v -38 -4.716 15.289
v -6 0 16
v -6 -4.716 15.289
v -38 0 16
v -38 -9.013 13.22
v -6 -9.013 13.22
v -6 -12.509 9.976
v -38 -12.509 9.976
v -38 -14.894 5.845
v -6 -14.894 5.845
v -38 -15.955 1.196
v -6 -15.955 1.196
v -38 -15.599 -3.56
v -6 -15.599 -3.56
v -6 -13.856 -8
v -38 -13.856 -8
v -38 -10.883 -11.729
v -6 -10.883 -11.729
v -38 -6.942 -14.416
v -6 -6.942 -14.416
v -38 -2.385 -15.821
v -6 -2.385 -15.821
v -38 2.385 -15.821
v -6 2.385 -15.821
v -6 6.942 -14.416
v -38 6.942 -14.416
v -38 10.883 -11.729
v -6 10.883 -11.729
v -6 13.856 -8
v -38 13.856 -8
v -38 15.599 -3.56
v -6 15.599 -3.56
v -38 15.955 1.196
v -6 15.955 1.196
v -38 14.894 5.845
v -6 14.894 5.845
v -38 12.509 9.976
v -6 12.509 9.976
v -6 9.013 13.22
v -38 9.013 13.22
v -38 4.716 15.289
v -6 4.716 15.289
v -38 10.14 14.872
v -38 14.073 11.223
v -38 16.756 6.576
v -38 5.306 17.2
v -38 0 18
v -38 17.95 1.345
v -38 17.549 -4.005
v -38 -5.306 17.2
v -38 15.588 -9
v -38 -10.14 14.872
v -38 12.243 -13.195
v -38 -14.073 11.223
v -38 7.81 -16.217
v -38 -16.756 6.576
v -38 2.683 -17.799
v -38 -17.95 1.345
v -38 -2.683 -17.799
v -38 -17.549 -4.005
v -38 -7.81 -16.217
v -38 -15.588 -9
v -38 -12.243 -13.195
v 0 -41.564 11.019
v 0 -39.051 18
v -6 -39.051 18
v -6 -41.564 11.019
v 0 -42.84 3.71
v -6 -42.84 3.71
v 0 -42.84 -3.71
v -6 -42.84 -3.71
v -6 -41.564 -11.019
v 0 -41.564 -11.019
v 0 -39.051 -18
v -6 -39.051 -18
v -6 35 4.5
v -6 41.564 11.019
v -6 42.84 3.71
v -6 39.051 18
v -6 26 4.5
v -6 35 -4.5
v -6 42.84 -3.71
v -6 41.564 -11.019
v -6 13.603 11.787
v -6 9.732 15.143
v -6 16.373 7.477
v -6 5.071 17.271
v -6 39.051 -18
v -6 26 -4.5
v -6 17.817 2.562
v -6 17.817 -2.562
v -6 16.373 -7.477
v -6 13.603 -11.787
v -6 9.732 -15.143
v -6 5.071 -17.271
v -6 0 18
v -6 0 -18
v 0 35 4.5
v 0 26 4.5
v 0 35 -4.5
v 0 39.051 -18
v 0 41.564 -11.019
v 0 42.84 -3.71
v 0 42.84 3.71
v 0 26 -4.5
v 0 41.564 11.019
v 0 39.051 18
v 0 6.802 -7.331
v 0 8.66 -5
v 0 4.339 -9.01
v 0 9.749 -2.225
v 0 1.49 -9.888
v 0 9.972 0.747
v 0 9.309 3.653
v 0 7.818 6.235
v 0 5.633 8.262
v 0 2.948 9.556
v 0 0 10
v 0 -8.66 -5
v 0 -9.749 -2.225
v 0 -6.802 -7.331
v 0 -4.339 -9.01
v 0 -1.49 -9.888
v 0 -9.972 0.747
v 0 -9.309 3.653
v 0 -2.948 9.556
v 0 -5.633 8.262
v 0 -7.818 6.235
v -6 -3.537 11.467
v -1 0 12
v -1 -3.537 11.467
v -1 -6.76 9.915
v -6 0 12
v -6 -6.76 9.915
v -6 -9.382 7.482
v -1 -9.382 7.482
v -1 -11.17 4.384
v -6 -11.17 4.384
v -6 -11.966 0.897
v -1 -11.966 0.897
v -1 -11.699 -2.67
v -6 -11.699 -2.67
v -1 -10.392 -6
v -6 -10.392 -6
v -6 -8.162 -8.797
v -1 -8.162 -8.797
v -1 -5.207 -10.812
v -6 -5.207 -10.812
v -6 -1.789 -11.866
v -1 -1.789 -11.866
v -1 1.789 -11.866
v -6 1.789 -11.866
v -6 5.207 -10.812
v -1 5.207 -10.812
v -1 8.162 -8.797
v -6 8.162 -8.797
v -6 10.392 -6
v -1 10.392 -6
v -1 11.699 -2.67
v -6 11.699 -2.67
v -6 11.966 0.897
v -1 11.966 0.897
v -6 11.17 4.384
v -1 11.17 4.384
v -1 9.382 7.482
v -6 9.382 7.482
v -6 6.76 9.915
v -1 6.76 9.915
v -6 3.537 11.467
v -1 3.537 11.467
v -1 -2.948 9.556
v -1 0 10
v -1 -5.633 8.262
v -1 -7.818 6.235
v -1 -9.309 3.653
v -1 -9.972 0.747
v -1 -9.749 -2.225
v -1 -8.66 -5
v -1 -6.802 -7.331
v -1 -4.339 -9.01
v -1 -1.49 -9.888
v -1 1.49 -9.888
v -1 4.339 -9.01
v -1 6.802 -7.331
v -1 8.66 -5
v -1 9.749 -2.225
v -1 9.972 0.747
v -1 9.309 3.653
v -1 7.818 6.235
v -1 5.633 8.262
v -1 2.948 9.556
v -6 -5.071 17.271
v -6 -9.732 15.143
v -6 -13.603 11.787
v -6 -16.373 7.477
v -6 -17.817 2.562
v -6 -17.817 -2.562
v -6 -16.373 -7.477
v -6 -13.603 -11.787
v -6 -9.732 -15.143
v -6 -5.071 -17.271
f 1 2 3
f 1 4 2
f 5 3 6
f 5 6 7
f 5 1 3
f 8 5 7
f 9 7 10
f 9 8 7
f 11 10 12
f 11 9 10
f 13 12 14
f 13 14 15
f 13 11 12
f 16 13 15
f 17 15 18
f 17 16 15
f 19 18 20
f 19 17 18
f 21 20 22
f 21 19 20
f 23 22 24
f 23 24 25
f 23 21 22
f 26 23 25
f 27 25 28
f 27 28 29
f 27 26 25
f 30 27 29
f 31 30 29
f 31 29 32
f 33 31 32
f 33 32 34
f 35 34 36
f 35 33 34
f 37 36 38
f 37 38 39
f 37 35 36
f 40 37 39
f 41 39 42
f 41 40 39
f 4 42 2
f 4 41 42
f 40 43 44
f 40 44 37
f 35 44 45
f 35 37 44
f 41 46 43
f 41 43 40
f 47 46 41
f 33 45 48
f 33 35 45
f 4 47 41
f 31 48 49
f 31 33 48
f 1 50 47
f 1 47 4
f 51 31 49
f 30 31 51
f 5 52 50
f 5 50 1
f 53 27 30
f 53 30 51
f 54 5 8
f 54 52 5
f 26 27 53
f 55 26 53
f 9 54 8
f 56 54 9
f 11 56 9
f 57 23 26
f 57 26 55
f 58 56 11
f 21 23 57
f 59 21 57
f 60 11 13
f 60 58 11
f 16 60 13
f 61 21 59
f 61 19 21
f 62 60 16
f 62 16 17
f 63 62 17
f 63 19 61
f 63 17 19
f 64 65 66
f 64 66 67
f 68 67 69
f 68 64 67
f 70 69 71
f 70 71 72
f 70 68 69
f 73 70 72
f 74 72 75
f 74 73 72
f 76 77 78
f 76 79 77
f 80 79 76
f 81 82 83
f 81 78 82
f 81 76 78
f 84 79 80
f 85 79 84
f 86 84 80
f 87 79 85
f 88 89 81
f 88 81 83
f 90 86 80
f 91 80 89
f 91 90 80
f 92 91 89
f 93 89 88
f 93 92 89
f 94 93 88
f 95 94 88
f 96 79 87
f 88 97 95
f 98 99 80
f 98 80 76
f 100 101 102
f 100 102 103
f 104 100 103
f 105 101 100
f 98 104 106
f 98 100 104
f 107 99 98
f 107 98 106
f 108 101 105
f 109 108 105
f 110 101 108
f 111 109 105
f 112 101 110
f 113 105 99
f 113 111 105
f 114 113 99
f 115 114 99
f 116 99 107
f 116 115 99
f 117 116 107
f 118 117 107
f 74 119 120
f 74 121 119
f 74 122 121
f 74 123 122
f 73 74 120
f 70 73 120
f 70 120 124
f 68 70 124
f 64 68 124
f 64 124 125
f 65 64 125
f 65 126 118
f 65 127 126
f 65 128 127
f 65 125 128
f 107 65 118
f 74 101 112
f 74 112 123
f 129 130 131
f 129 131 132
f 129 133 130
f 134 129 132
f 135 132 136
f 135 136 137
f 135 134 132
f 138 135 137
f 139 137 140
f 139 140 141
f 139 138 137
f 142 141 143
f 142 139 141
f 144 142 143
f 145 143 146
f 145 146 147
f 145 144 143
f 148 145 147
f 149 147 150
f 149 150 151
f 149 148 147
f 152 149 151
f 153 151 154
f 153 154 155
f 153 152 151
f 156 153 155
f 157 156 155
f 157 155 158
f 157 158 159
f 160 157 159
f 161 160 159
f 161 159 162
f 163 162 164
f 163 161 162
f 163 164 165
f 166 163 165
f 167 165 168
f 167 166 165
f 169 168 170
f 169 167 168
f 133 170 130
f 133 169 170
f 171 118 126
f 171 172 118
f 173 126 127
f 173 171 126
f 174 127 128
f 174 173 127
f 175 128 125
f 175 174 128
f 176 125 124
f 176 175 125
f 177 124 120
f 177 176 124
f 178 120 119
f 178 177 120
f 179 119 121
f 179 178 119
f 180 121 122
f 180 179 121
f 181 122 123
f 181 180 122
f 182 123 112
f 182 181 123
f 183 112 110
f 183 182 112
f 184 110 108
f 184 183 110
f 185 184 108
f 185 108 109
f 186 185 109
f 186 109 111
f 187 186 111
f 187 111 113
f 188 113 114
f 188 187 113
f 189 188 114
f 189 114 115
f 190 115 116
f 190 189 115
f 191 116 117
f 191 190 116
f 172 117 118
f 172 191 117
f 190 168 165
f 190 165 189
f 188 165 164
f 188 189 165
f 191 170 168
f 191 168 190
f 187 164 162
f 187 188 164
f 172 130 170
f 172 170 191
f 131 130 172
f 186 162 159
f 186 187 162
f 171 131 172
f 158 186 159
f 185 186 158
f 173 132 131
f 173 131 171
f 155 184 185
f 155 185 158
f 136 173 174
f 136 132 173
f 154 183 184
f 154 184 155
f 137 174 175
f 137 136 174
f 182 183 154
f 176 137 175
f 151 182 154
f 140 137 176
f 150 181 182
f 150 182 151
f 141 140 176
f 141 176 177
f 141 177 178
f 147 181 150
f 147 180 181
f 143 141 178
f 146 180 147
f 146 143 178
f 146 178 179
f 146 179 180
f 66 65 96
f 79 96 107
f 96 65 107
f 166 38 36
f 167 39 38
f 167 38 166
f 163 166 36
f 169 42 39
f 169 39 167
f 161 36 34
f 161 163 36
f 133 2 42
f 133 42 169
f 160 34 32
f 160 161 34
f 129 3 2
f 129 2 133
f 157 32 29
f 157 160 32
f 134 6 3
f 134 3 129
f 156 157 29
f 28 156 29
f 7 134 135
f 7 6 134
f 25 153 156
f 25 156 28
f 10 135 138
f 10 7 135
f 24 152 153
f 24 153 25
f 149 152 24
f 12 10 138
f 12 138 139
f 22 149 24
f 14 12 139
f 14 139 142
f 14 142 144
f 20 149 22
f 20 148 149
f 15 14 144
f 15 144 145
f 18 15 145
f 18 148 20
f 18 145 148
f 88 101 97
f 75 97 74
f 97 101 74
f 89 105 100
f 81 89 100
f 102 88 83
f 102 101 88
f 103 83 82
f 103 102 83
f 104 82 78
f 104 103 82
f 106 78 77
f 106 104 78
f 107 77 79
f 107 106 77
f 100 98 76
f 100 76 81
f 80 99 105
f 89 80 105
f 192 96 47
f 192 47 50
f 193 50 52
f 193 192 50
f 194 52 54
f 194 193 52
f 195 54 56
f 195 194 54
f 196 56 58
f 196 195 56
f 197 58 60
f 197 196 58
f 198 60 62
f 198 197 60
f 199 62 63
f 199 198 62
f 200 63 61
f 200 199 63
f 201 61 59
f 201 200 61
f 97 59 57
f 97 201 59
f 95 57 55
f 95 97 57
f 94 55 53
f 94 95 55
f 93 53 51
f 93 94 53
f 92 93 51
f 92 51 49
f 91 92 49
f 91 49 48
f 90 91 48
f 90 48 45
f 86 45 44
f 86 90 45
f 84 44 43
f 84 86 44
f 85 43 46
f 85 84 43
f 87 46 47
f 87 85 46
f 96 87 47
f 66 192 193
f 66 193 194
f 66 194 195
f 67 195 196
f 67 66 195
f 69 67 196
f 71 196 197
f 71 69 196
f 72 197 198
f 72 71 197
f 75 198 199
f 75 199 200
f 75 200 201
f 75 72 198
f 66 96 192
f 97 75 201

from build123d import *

# Parameters (mm, degrees)
SKETCH2_W          = 9
SKETCH2_H          = 9
CUT_EXTRUDE1_DEPTH = 6


with BuildPart() as part:
    # Sketch1 → Revolve1 (revolve)
    with BuildSketch(Plane.XY, mode=Mode.PRIVATE) as revolve1_sk:
        Polygon((-1, 12), (-6, 12), (-6, 16), (-38, 16), (-38, 18), (-6, 18), (-6, 43), (0, 43), (0, 10), (-1, 10), align=None)
    revolve(revolve1_sk.sketch.rotate(Axis((-42.809570876, 0, 0), (1, 0, 0)), 90), axis=Axis((-42.809570876, 0, 0), (1, 0, 0)))

    # Sketch2 → Cut-Extrude1 (cut)
    with BuildSketch(Plane(origin=(0, 0, 0), x_dir=(0, 0, -1), z_dir=(1, 0, 0))):
        with BuildLine():
            Line((-18, -39.05124838), (-18, 39.05124838))
            ThreePointArc((-18, 39.05124838), (-43, 0), (-18, -39.05124838))
        make_face()
        with Locations((0, 30.5)):
            Rectangle(SKETCH2_W, SKETCH2_H)
        with BuildLine():
            ThreePointArc((43, 0), (36.214637924, 23.184046239), (18, 39.05124838))
            Line((18, 39.05124838), (18, -39.05124838))
            ThreePointArc((18, -39.05124838), (36.214637924, -23.184046239), (43, 0))
        make_face()
    extrude(amount=-CUT_EXTRUDE1_DEPTH, mode=Mode.SUBTRACT)


solid = part.part
